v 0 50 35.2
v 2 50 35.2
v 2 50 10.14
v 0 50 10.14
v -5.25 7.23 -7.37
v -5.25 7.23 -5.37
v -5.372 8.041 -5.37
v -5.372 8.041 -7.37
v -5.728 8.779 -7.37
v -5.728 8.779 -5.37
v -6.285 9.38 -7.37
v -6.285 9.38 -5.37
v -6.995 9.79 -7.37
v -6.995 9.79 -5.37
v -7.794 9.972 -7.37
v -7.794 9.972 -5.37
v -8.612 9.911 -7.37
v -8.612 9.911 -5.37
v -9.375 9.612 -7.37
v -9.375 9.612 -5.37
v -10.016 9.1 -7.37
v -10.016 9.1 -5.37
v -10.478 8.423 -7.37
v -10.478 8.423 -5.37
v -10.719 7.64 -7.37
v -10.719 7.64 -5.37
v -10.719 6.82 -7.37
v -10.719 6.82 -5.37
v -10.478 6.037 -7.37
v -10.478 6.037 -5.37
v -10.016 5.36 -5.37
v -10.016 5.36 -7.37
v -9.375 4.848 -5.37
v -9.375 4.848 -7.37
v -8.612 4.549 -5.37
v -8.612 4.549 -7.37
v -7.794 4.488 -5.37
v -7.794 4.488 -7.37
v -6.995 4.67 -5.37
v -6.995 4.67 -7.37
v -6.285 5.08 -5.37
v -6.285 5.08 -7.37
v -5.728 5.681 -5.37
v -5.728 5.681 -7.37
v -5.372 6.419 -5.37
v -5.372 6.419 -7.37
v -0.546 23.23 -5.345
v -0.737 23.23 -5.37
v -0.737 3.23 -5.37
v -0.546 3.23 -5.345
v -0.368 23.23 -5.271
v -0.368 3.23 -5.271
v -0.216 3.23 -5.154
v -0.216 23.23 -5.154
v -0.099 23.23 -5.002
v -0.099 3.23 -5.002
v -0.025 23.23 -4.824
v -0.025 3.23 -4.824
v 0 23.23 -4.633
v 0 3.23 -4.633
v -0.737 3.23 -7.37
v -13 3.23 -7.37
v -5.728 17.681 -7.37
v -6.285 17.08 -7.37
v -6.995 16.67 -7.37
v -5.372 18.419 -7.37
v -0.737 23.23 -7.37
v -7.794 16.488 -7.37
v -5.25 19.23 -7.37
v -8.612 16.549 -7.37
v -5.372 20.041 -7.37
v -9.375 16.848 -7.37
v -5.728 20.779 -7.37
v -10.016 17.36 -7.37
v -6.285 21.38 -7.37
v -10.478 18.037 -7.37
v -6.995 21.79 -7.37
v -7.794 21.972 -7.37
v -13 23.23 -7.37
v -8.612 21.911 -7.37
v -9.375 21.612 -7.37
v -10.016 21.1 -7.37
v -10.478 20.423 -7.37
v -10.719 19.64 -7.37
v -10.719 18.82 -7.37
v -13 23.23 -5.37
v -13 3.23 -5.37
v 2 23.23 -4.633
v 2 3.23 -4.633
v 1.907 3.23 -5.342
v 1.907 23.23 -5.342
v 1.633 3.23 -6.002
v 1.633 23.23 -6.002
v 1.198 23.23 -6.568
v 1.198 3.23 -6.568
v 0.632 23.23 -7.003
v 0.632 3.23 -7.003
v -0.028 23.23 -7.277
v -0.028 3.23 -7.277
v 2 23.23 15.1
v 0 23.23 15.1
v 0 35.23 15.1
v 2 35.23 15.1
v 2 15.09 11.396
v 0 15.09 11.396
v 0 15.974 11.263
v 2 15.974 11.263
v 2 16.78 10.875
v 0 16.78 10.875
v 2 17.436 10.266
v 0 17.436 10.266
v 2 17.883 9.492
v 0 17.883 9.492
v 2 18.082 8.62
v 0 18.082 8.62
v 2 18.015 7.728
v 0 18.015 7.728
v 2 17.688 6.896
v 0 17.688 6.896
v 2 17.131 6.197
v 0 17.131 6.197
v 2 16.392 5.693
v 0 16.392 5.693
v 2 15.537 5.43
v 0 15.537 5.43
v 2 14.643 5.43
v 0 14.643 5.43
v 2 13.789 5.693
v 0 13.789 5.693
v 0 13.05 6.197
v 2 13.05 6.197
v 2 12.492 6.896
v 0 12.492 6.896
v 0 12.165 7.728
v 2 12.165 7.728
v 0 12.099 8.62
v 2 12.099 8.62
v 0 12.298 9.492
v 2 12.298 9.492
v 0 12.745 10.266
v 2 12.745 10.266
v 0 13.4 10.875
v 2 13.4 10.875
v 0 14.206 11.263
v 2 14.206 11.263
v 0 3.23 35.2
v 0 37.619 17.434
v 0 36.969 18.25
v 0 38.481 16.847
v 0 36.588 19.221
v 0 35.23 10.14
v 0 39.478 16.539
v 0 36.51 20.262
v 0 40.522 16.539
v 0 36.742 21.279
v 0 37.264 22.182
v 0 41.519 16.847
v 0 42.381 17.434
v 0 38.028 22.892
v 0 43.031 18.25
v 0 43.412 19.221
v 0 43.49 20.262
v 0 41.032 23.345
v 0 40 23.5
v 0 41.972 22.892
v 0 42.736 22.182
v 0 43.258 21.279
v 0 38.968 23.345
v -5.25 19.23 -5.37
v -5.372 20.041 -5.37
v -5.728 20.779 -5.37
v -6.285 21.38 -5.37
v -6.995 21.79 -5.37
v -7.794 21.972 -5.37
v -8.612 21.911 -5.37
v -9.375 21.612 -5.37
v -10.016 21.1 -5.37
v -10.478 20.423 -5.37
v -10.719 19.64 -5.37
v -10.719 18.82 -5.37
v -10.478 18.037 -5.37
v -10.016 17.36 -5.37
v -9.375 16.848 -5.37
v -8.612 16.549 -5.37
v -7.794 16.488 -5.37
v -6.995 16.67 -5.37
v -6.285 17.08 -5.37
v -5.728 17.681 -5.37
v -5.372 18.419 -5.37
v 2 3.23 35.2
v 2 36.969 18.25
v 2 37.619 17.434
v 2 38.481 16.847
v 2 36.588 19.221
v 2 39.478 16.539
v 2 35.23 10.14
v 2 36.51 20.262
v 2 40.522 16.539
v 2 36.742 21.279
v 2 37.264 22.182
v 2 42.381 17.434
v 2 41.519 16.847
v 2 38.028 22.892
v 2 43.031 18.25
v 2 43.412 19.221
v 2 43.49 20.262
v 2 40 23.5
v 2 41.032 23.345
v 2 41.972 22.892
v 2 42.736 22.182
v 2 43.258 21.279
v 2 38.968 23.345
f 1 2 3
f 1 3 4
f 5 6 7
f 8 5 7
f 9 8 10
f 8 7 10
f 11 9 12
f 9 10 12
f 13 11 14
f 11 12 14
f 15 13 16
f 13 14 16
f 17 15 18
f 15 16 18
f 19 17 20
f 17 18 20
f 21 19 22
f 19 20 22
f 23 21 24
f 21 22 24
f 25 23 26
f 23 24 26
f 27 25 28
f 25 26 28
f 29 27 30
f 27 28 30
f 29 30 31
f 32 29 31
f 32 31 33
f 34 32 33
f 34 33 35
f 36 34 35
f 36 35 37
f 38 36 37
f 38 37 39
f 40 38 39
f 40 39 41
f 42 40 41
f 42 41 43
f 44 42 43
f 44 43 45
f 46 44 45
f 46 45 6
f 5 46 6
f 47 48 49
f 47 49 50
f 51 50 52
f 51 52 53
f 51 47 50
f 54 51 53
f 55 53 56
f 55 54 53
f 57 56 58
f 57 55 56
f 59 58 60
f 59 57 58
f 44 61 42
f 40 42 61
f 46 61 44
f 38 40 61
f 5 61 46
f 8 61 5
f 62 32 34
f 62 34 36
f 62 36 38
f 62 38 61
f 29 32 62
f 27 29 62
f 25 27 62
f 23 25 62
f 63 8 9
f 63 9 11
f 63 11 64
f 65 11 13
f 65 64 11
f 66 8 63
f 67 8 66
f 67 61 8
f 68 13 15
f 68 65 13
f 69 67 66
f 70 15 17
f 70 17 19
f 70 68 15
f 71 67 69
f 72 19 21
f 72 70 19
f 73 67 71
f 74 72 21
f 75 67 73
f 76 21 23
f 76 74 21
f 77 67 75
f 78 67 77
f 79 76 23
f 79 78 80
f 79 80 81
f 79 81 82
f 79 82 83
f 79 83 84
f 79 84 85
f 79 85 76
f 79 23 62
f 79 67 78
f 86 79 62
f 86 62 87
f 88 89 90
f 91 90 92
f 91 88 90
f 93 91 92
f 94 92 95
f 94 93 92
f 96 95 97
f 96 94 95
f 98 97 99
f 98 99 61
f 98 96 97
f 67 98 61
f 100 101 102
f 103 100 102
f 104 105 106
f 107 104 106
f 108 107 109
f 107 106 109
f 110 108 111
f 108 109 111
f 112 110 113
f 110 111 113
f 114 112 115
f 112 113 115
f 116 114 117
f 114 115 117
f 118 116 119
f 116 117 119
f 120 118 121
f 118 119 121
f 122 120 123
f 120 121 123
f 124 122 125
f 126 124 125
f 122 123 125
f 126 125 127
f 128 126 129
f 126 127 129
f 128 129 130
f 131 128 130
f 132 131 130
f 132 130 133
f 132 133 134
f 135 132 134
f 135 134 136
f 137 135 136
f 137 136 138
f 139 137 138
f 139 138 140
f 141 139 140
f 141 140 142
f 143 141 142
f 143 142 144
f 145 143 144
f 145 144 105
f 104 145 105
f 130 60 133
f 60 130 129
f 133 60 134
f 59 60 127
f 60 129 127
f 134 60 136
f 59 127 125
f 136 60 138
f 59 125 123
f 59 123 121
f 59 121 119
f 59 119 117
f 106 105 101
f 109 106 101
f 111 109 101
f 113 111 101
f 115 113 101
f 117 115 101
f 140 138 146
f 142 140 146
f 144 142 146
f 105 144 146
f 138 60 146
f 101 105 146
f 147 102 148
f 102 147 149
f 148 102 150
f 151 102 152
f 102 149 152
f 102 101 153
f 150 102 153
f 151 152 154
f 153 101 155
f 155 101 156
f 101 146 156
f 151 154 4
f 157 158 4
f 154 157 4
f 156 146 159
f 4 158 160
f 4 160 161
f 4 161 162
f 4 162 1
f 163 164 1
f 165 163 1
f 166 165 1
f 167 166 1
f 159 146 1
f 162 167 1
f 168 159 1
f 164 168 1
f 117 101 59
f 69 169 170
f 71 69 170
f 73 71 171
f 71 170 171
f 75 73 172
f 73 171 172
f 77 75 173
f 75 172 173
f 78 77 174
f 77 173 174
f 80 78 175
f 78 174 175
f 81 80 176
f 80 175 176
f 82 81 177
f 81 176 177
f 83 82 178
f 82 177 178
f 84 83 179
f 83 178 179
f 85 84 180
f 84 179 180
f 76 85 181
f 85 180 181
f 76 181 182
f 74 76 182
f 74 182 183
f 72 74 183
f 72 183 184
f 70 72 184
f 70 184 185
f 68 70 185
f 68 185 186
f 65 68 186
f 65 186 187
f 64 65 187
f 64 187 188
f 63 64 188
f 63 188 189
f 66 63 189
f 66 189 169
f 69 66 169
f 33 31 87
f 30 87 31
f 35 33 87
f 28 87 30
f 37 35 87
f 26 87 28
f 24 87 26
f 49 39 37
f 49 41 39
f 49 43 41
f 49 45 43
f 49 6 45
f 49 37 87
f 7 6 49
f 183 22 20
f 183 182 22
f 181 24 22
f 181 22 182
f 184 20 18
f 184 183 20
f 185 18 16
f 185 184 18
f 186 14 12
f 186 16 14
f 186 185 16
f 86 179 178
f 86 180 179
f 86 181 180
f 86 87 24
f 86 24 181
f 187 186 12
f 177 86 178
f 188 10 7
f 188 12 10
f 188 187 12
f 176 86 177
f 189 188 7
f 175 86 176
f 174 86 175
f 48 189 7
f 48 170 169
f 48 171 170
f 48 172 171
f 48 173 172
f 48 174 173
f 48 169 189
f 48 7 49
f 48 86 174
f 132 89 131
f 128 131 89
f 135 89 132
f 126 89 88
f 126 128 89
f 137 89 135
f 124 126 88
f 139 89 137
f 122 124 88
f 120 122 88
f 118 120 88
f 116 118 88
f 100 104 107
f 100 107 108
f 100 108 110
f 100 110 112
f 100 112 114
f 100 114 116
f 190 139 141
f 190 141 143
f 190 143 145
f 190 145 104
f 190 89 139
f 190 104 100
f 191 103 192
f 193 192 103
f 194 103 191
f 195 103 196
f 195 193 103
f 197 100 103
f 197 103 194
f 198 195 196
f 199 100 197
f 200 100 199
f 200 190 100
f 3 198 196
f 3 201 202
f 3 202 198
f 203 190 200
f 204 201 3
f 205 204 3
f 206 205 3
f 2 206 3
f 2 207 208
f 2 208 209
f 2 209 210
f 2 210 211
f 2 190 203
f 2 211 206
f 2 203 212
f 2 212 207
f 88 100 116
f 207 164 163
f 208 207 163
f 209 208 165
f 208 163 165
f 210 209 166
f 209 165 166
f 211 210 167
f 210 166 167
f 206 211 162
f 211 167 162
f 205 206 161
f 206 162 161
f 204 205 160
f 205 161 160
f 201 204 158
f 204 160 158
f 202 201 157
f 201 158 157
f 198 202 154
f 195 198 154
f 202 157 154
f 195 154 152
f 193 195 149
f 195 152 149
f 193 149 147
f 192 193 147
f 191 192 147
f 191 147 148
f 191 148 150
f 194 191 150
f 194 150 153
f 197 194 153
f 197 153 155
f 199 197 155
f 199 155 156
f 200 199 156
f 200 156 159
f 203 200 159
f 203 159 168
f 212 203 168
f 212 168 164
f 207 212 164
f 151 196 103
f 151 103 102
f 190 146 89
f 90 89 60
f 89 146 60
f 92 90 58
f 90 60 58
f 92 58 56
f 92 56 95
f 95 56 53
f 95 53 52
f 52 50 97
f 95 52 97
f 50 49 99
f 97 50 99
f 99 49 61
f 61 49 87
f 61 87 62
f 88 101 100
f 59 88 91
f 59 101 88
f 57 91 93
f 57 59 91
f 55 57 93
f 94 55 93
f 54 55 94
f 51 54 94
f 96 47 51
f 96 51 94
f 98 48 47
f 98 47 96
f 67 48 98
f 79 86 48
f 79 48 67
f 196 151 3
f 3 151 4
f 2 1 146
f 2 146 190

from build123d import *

# Parameters (mm, degrees)
SKETCH_1_W                       = 2
SKETCH_1_H                       = 50
SM_BASE_FLANGE_1_DEPTH           = 35.2
SKETCH_7_W                       = 16.759406963
SKETCH_7_H                       = 59.520719971
CUT_EXTRUDE_2_DEPTH              = 4.8
SKETCH_9_W                       = 8.068883198
SKETCH_9_H                       = 35.697926428
CUT_EXTRUDE_3_DEPTH              = 3.23
SKETCH_6_R                       = 3.5
CUT_EXTRUDE_5_DEPTH              = 10
SKETCH_15_W                      = 15.322876818
SKETCH_15_H                      = 12
CUT_EXTRUDE_7_DEPTH              = 10
SKETCH_18_R                      = 3
CUT_EXTRUDE_8_DEPTH              = 10
SKETCH_19_W                      = 2
SKETCH_19_H                      = 14.77
SKETCH_19_H_2                    = 20
EXTRUDE_1_DEPTH                  = 2.66
SKETCH_20_W                      = 8
SKETCH_20_H                      = 14.77
CUT_EXTRUDE_9_DEPTH              = 8
SKETCH_21_W                      = 2
SKETCH_21_H                      = 20
EXTRUDE_2_DEPTH                  = 9.51
SM_EDGE_FLANGE_1_STRIP_W         = 9.4732
SM_EDGE_FLANGE_1_STRIP_H         = 2
SM_EDGE_FLANGE_1_STRIP_CUT_DEPTH = 20
SM_EDGE_FLANGE_1_DEPTH           = 20
SKETCH_27_R                      = 2.75
CUT_EXTRUDE_10_DEPTH             = 9.51


# Sheet-metal steps are written as plain solids
with BuildPart() as part:
    # Sketch 1 → 基体-法兰1 (new body)
    with BuildSketch(Plane.XY):
        with Locations((1, 25)):
            Rectangle(SKETCH_1_W, SKETCH_1_H)
    extrude(amount=SM_BASE_FLANGE_1_DEPTH)

    # 草图7 → 切除-拉伸2 (cut)
    with BuildSketch(Plane(origin=(0, 0, 0), x_dir=(-1, 0, 0), z_dir=(0, 0, -1))):
        with Locations((6.379703482, 29.760359986)):
            Rectangle(SKETCH_7_W, SKETCH_7_H)
    extrude(amount=-CUT_EXTRUDE_2_DEPTH, mode=Mode.SUBTRACT)

    # 草图9 → 切除-拉伸3 (cut)
    with BuildSketch(Plane.XZ):
        with Locations((4.034441599, 17.351036786)):
            Rectangle(SKETCH_9_W, SKETCH_9_H)
    extrude(amount=-CUT_EXTRUDE_3_DEPTH, mode=Mode.SUBTRACT)

    # 草图6 → 切除-拉伸5 (cut)
    with BuildSketch(Plane.ZY):
        with Locations((20, 40)):
            Circle(SKETCH_6_R)
    extrude(amount=-CUT_EXTRUDE_5_DEPTH, mode=Mode.SUBTRACT)

    # 草图15 → 切除-拉伸7 (cut)
    with BuildSketch(Plane.ZY):
        with Locations((7.438561591, 29.23)):
            Rectangle(SKETCH_15_W, SKETCH_15_H)
    extrude(amount=-CUT_EXTRUDE_7_DEPTH, mode=Mode.SUBTRACT)

    # 草图18 → 切除-拉伸8 (cut)
    with BuildSketch(Plane.ZY):
        with Locations((8.3960026, 15.09020987)):
            Circle(SKETCH_18_R)
    extrude(amount=-CUT_EXTRUDE_8_DEPTH, mode=Mode.SUBTRACT)

    # 草图19 → 凸台-拉伸1 (add)
    with BuildSketch(Plane(origin=(0, 0, 4.8), x_dir=(-1, 0, 0), z_dir=(0, 0, -1))):
        with Locations((-1, 42.615)):
            Rectangle(SKETCH_19_W, SKETCH_19_H)
        with Locations((-1, 13.23)):
            Rectangle(SKETCH_19_W, SKETCH_19_H_2)
    extrude(amount=EXTRUDE_1_DEPTH)

    # 草图20 → 切除-拉伸9 (cut)
    with BuildSketch(Plane.ZY):
        with Locations((6.14, 42.615)):
            Rectangle(SKETCH_20_W, SKETCH_20_H)
    extrude(amount=-CUT_EXTRUDE_9_DEPTH, mode=Mode.SUBTRACT)

    # 草图21 → 凸台-拉伸2 (add)
    with BuildSketch(Plane(origin=(0, 0, 2.14), x_dir=(-1, 0, 0), z_dir=(0, 0, -1))):
        with Locations((-1, 13.23)):
            Rectangle(SKETCH_21_W, SKETCH_21_H)
    extrude(amount=EXTRUDE_2_DEPTH)

    # 边线-法兰1 strip (across the edge) → 边线-法兰1 strip cut (cut)
    with BuildSketch(Plane(origin=(0, 23.23, -7.37), x_dir=(0, 0, 1), z_dir=(0, -1, 0))):
        with Locations((-2, -1)):
            Rectangle(SM_EDGE_FLANGE_1_STRIP_W, SM_EDGE_FLANGE_1_STRIP_H)
    extrude(amount=SM_EDGE_FLANGE_1_STRIP_CUT_DEPTH, mode=Mode.SUBTRACT)

    # 边线-法兰1 section (across the edge) → 边线-法兰1 (add)
    with BuildSketch(Plane(origin=(0, 23.23, -7.37), x_dir=(0, 0, 1), z_dir=(0, -1, 0))):
        with BuildLine():
            Line((0, 0.7366), (0, 13))
            Line((0, 13), (2, 13))
            Line((2, 13), (2, 0.7366))
            ThreePointArc((2, 0.7366), (2.215745145, 0.215745145), (2.7366, 0))
            Line((2.7366, 0), (2.7366, -2))
            ThreePointArc((2.7366, -2), (0.801531583, -1.198468417), (0, 0.7366))
        make_face()
    extrude(amount=SM_EDGE_FLANGE_1_DEPTH)

    # 草图27 → 切除-拉伸10 (cut)
    with BuildSketch(Plane.XY.offset(-5.37)):
        with Locations((-8, 19.23)):
            Circle(SKETCH_27_R)
        with Locations((-8, 7.23)):
            Circle(SKETCH_27_R)
    extrude(amount=-CUT_EXTRUDE_10_DEPTH, mode=Mode.SUBTRACT)


solid = part.part
